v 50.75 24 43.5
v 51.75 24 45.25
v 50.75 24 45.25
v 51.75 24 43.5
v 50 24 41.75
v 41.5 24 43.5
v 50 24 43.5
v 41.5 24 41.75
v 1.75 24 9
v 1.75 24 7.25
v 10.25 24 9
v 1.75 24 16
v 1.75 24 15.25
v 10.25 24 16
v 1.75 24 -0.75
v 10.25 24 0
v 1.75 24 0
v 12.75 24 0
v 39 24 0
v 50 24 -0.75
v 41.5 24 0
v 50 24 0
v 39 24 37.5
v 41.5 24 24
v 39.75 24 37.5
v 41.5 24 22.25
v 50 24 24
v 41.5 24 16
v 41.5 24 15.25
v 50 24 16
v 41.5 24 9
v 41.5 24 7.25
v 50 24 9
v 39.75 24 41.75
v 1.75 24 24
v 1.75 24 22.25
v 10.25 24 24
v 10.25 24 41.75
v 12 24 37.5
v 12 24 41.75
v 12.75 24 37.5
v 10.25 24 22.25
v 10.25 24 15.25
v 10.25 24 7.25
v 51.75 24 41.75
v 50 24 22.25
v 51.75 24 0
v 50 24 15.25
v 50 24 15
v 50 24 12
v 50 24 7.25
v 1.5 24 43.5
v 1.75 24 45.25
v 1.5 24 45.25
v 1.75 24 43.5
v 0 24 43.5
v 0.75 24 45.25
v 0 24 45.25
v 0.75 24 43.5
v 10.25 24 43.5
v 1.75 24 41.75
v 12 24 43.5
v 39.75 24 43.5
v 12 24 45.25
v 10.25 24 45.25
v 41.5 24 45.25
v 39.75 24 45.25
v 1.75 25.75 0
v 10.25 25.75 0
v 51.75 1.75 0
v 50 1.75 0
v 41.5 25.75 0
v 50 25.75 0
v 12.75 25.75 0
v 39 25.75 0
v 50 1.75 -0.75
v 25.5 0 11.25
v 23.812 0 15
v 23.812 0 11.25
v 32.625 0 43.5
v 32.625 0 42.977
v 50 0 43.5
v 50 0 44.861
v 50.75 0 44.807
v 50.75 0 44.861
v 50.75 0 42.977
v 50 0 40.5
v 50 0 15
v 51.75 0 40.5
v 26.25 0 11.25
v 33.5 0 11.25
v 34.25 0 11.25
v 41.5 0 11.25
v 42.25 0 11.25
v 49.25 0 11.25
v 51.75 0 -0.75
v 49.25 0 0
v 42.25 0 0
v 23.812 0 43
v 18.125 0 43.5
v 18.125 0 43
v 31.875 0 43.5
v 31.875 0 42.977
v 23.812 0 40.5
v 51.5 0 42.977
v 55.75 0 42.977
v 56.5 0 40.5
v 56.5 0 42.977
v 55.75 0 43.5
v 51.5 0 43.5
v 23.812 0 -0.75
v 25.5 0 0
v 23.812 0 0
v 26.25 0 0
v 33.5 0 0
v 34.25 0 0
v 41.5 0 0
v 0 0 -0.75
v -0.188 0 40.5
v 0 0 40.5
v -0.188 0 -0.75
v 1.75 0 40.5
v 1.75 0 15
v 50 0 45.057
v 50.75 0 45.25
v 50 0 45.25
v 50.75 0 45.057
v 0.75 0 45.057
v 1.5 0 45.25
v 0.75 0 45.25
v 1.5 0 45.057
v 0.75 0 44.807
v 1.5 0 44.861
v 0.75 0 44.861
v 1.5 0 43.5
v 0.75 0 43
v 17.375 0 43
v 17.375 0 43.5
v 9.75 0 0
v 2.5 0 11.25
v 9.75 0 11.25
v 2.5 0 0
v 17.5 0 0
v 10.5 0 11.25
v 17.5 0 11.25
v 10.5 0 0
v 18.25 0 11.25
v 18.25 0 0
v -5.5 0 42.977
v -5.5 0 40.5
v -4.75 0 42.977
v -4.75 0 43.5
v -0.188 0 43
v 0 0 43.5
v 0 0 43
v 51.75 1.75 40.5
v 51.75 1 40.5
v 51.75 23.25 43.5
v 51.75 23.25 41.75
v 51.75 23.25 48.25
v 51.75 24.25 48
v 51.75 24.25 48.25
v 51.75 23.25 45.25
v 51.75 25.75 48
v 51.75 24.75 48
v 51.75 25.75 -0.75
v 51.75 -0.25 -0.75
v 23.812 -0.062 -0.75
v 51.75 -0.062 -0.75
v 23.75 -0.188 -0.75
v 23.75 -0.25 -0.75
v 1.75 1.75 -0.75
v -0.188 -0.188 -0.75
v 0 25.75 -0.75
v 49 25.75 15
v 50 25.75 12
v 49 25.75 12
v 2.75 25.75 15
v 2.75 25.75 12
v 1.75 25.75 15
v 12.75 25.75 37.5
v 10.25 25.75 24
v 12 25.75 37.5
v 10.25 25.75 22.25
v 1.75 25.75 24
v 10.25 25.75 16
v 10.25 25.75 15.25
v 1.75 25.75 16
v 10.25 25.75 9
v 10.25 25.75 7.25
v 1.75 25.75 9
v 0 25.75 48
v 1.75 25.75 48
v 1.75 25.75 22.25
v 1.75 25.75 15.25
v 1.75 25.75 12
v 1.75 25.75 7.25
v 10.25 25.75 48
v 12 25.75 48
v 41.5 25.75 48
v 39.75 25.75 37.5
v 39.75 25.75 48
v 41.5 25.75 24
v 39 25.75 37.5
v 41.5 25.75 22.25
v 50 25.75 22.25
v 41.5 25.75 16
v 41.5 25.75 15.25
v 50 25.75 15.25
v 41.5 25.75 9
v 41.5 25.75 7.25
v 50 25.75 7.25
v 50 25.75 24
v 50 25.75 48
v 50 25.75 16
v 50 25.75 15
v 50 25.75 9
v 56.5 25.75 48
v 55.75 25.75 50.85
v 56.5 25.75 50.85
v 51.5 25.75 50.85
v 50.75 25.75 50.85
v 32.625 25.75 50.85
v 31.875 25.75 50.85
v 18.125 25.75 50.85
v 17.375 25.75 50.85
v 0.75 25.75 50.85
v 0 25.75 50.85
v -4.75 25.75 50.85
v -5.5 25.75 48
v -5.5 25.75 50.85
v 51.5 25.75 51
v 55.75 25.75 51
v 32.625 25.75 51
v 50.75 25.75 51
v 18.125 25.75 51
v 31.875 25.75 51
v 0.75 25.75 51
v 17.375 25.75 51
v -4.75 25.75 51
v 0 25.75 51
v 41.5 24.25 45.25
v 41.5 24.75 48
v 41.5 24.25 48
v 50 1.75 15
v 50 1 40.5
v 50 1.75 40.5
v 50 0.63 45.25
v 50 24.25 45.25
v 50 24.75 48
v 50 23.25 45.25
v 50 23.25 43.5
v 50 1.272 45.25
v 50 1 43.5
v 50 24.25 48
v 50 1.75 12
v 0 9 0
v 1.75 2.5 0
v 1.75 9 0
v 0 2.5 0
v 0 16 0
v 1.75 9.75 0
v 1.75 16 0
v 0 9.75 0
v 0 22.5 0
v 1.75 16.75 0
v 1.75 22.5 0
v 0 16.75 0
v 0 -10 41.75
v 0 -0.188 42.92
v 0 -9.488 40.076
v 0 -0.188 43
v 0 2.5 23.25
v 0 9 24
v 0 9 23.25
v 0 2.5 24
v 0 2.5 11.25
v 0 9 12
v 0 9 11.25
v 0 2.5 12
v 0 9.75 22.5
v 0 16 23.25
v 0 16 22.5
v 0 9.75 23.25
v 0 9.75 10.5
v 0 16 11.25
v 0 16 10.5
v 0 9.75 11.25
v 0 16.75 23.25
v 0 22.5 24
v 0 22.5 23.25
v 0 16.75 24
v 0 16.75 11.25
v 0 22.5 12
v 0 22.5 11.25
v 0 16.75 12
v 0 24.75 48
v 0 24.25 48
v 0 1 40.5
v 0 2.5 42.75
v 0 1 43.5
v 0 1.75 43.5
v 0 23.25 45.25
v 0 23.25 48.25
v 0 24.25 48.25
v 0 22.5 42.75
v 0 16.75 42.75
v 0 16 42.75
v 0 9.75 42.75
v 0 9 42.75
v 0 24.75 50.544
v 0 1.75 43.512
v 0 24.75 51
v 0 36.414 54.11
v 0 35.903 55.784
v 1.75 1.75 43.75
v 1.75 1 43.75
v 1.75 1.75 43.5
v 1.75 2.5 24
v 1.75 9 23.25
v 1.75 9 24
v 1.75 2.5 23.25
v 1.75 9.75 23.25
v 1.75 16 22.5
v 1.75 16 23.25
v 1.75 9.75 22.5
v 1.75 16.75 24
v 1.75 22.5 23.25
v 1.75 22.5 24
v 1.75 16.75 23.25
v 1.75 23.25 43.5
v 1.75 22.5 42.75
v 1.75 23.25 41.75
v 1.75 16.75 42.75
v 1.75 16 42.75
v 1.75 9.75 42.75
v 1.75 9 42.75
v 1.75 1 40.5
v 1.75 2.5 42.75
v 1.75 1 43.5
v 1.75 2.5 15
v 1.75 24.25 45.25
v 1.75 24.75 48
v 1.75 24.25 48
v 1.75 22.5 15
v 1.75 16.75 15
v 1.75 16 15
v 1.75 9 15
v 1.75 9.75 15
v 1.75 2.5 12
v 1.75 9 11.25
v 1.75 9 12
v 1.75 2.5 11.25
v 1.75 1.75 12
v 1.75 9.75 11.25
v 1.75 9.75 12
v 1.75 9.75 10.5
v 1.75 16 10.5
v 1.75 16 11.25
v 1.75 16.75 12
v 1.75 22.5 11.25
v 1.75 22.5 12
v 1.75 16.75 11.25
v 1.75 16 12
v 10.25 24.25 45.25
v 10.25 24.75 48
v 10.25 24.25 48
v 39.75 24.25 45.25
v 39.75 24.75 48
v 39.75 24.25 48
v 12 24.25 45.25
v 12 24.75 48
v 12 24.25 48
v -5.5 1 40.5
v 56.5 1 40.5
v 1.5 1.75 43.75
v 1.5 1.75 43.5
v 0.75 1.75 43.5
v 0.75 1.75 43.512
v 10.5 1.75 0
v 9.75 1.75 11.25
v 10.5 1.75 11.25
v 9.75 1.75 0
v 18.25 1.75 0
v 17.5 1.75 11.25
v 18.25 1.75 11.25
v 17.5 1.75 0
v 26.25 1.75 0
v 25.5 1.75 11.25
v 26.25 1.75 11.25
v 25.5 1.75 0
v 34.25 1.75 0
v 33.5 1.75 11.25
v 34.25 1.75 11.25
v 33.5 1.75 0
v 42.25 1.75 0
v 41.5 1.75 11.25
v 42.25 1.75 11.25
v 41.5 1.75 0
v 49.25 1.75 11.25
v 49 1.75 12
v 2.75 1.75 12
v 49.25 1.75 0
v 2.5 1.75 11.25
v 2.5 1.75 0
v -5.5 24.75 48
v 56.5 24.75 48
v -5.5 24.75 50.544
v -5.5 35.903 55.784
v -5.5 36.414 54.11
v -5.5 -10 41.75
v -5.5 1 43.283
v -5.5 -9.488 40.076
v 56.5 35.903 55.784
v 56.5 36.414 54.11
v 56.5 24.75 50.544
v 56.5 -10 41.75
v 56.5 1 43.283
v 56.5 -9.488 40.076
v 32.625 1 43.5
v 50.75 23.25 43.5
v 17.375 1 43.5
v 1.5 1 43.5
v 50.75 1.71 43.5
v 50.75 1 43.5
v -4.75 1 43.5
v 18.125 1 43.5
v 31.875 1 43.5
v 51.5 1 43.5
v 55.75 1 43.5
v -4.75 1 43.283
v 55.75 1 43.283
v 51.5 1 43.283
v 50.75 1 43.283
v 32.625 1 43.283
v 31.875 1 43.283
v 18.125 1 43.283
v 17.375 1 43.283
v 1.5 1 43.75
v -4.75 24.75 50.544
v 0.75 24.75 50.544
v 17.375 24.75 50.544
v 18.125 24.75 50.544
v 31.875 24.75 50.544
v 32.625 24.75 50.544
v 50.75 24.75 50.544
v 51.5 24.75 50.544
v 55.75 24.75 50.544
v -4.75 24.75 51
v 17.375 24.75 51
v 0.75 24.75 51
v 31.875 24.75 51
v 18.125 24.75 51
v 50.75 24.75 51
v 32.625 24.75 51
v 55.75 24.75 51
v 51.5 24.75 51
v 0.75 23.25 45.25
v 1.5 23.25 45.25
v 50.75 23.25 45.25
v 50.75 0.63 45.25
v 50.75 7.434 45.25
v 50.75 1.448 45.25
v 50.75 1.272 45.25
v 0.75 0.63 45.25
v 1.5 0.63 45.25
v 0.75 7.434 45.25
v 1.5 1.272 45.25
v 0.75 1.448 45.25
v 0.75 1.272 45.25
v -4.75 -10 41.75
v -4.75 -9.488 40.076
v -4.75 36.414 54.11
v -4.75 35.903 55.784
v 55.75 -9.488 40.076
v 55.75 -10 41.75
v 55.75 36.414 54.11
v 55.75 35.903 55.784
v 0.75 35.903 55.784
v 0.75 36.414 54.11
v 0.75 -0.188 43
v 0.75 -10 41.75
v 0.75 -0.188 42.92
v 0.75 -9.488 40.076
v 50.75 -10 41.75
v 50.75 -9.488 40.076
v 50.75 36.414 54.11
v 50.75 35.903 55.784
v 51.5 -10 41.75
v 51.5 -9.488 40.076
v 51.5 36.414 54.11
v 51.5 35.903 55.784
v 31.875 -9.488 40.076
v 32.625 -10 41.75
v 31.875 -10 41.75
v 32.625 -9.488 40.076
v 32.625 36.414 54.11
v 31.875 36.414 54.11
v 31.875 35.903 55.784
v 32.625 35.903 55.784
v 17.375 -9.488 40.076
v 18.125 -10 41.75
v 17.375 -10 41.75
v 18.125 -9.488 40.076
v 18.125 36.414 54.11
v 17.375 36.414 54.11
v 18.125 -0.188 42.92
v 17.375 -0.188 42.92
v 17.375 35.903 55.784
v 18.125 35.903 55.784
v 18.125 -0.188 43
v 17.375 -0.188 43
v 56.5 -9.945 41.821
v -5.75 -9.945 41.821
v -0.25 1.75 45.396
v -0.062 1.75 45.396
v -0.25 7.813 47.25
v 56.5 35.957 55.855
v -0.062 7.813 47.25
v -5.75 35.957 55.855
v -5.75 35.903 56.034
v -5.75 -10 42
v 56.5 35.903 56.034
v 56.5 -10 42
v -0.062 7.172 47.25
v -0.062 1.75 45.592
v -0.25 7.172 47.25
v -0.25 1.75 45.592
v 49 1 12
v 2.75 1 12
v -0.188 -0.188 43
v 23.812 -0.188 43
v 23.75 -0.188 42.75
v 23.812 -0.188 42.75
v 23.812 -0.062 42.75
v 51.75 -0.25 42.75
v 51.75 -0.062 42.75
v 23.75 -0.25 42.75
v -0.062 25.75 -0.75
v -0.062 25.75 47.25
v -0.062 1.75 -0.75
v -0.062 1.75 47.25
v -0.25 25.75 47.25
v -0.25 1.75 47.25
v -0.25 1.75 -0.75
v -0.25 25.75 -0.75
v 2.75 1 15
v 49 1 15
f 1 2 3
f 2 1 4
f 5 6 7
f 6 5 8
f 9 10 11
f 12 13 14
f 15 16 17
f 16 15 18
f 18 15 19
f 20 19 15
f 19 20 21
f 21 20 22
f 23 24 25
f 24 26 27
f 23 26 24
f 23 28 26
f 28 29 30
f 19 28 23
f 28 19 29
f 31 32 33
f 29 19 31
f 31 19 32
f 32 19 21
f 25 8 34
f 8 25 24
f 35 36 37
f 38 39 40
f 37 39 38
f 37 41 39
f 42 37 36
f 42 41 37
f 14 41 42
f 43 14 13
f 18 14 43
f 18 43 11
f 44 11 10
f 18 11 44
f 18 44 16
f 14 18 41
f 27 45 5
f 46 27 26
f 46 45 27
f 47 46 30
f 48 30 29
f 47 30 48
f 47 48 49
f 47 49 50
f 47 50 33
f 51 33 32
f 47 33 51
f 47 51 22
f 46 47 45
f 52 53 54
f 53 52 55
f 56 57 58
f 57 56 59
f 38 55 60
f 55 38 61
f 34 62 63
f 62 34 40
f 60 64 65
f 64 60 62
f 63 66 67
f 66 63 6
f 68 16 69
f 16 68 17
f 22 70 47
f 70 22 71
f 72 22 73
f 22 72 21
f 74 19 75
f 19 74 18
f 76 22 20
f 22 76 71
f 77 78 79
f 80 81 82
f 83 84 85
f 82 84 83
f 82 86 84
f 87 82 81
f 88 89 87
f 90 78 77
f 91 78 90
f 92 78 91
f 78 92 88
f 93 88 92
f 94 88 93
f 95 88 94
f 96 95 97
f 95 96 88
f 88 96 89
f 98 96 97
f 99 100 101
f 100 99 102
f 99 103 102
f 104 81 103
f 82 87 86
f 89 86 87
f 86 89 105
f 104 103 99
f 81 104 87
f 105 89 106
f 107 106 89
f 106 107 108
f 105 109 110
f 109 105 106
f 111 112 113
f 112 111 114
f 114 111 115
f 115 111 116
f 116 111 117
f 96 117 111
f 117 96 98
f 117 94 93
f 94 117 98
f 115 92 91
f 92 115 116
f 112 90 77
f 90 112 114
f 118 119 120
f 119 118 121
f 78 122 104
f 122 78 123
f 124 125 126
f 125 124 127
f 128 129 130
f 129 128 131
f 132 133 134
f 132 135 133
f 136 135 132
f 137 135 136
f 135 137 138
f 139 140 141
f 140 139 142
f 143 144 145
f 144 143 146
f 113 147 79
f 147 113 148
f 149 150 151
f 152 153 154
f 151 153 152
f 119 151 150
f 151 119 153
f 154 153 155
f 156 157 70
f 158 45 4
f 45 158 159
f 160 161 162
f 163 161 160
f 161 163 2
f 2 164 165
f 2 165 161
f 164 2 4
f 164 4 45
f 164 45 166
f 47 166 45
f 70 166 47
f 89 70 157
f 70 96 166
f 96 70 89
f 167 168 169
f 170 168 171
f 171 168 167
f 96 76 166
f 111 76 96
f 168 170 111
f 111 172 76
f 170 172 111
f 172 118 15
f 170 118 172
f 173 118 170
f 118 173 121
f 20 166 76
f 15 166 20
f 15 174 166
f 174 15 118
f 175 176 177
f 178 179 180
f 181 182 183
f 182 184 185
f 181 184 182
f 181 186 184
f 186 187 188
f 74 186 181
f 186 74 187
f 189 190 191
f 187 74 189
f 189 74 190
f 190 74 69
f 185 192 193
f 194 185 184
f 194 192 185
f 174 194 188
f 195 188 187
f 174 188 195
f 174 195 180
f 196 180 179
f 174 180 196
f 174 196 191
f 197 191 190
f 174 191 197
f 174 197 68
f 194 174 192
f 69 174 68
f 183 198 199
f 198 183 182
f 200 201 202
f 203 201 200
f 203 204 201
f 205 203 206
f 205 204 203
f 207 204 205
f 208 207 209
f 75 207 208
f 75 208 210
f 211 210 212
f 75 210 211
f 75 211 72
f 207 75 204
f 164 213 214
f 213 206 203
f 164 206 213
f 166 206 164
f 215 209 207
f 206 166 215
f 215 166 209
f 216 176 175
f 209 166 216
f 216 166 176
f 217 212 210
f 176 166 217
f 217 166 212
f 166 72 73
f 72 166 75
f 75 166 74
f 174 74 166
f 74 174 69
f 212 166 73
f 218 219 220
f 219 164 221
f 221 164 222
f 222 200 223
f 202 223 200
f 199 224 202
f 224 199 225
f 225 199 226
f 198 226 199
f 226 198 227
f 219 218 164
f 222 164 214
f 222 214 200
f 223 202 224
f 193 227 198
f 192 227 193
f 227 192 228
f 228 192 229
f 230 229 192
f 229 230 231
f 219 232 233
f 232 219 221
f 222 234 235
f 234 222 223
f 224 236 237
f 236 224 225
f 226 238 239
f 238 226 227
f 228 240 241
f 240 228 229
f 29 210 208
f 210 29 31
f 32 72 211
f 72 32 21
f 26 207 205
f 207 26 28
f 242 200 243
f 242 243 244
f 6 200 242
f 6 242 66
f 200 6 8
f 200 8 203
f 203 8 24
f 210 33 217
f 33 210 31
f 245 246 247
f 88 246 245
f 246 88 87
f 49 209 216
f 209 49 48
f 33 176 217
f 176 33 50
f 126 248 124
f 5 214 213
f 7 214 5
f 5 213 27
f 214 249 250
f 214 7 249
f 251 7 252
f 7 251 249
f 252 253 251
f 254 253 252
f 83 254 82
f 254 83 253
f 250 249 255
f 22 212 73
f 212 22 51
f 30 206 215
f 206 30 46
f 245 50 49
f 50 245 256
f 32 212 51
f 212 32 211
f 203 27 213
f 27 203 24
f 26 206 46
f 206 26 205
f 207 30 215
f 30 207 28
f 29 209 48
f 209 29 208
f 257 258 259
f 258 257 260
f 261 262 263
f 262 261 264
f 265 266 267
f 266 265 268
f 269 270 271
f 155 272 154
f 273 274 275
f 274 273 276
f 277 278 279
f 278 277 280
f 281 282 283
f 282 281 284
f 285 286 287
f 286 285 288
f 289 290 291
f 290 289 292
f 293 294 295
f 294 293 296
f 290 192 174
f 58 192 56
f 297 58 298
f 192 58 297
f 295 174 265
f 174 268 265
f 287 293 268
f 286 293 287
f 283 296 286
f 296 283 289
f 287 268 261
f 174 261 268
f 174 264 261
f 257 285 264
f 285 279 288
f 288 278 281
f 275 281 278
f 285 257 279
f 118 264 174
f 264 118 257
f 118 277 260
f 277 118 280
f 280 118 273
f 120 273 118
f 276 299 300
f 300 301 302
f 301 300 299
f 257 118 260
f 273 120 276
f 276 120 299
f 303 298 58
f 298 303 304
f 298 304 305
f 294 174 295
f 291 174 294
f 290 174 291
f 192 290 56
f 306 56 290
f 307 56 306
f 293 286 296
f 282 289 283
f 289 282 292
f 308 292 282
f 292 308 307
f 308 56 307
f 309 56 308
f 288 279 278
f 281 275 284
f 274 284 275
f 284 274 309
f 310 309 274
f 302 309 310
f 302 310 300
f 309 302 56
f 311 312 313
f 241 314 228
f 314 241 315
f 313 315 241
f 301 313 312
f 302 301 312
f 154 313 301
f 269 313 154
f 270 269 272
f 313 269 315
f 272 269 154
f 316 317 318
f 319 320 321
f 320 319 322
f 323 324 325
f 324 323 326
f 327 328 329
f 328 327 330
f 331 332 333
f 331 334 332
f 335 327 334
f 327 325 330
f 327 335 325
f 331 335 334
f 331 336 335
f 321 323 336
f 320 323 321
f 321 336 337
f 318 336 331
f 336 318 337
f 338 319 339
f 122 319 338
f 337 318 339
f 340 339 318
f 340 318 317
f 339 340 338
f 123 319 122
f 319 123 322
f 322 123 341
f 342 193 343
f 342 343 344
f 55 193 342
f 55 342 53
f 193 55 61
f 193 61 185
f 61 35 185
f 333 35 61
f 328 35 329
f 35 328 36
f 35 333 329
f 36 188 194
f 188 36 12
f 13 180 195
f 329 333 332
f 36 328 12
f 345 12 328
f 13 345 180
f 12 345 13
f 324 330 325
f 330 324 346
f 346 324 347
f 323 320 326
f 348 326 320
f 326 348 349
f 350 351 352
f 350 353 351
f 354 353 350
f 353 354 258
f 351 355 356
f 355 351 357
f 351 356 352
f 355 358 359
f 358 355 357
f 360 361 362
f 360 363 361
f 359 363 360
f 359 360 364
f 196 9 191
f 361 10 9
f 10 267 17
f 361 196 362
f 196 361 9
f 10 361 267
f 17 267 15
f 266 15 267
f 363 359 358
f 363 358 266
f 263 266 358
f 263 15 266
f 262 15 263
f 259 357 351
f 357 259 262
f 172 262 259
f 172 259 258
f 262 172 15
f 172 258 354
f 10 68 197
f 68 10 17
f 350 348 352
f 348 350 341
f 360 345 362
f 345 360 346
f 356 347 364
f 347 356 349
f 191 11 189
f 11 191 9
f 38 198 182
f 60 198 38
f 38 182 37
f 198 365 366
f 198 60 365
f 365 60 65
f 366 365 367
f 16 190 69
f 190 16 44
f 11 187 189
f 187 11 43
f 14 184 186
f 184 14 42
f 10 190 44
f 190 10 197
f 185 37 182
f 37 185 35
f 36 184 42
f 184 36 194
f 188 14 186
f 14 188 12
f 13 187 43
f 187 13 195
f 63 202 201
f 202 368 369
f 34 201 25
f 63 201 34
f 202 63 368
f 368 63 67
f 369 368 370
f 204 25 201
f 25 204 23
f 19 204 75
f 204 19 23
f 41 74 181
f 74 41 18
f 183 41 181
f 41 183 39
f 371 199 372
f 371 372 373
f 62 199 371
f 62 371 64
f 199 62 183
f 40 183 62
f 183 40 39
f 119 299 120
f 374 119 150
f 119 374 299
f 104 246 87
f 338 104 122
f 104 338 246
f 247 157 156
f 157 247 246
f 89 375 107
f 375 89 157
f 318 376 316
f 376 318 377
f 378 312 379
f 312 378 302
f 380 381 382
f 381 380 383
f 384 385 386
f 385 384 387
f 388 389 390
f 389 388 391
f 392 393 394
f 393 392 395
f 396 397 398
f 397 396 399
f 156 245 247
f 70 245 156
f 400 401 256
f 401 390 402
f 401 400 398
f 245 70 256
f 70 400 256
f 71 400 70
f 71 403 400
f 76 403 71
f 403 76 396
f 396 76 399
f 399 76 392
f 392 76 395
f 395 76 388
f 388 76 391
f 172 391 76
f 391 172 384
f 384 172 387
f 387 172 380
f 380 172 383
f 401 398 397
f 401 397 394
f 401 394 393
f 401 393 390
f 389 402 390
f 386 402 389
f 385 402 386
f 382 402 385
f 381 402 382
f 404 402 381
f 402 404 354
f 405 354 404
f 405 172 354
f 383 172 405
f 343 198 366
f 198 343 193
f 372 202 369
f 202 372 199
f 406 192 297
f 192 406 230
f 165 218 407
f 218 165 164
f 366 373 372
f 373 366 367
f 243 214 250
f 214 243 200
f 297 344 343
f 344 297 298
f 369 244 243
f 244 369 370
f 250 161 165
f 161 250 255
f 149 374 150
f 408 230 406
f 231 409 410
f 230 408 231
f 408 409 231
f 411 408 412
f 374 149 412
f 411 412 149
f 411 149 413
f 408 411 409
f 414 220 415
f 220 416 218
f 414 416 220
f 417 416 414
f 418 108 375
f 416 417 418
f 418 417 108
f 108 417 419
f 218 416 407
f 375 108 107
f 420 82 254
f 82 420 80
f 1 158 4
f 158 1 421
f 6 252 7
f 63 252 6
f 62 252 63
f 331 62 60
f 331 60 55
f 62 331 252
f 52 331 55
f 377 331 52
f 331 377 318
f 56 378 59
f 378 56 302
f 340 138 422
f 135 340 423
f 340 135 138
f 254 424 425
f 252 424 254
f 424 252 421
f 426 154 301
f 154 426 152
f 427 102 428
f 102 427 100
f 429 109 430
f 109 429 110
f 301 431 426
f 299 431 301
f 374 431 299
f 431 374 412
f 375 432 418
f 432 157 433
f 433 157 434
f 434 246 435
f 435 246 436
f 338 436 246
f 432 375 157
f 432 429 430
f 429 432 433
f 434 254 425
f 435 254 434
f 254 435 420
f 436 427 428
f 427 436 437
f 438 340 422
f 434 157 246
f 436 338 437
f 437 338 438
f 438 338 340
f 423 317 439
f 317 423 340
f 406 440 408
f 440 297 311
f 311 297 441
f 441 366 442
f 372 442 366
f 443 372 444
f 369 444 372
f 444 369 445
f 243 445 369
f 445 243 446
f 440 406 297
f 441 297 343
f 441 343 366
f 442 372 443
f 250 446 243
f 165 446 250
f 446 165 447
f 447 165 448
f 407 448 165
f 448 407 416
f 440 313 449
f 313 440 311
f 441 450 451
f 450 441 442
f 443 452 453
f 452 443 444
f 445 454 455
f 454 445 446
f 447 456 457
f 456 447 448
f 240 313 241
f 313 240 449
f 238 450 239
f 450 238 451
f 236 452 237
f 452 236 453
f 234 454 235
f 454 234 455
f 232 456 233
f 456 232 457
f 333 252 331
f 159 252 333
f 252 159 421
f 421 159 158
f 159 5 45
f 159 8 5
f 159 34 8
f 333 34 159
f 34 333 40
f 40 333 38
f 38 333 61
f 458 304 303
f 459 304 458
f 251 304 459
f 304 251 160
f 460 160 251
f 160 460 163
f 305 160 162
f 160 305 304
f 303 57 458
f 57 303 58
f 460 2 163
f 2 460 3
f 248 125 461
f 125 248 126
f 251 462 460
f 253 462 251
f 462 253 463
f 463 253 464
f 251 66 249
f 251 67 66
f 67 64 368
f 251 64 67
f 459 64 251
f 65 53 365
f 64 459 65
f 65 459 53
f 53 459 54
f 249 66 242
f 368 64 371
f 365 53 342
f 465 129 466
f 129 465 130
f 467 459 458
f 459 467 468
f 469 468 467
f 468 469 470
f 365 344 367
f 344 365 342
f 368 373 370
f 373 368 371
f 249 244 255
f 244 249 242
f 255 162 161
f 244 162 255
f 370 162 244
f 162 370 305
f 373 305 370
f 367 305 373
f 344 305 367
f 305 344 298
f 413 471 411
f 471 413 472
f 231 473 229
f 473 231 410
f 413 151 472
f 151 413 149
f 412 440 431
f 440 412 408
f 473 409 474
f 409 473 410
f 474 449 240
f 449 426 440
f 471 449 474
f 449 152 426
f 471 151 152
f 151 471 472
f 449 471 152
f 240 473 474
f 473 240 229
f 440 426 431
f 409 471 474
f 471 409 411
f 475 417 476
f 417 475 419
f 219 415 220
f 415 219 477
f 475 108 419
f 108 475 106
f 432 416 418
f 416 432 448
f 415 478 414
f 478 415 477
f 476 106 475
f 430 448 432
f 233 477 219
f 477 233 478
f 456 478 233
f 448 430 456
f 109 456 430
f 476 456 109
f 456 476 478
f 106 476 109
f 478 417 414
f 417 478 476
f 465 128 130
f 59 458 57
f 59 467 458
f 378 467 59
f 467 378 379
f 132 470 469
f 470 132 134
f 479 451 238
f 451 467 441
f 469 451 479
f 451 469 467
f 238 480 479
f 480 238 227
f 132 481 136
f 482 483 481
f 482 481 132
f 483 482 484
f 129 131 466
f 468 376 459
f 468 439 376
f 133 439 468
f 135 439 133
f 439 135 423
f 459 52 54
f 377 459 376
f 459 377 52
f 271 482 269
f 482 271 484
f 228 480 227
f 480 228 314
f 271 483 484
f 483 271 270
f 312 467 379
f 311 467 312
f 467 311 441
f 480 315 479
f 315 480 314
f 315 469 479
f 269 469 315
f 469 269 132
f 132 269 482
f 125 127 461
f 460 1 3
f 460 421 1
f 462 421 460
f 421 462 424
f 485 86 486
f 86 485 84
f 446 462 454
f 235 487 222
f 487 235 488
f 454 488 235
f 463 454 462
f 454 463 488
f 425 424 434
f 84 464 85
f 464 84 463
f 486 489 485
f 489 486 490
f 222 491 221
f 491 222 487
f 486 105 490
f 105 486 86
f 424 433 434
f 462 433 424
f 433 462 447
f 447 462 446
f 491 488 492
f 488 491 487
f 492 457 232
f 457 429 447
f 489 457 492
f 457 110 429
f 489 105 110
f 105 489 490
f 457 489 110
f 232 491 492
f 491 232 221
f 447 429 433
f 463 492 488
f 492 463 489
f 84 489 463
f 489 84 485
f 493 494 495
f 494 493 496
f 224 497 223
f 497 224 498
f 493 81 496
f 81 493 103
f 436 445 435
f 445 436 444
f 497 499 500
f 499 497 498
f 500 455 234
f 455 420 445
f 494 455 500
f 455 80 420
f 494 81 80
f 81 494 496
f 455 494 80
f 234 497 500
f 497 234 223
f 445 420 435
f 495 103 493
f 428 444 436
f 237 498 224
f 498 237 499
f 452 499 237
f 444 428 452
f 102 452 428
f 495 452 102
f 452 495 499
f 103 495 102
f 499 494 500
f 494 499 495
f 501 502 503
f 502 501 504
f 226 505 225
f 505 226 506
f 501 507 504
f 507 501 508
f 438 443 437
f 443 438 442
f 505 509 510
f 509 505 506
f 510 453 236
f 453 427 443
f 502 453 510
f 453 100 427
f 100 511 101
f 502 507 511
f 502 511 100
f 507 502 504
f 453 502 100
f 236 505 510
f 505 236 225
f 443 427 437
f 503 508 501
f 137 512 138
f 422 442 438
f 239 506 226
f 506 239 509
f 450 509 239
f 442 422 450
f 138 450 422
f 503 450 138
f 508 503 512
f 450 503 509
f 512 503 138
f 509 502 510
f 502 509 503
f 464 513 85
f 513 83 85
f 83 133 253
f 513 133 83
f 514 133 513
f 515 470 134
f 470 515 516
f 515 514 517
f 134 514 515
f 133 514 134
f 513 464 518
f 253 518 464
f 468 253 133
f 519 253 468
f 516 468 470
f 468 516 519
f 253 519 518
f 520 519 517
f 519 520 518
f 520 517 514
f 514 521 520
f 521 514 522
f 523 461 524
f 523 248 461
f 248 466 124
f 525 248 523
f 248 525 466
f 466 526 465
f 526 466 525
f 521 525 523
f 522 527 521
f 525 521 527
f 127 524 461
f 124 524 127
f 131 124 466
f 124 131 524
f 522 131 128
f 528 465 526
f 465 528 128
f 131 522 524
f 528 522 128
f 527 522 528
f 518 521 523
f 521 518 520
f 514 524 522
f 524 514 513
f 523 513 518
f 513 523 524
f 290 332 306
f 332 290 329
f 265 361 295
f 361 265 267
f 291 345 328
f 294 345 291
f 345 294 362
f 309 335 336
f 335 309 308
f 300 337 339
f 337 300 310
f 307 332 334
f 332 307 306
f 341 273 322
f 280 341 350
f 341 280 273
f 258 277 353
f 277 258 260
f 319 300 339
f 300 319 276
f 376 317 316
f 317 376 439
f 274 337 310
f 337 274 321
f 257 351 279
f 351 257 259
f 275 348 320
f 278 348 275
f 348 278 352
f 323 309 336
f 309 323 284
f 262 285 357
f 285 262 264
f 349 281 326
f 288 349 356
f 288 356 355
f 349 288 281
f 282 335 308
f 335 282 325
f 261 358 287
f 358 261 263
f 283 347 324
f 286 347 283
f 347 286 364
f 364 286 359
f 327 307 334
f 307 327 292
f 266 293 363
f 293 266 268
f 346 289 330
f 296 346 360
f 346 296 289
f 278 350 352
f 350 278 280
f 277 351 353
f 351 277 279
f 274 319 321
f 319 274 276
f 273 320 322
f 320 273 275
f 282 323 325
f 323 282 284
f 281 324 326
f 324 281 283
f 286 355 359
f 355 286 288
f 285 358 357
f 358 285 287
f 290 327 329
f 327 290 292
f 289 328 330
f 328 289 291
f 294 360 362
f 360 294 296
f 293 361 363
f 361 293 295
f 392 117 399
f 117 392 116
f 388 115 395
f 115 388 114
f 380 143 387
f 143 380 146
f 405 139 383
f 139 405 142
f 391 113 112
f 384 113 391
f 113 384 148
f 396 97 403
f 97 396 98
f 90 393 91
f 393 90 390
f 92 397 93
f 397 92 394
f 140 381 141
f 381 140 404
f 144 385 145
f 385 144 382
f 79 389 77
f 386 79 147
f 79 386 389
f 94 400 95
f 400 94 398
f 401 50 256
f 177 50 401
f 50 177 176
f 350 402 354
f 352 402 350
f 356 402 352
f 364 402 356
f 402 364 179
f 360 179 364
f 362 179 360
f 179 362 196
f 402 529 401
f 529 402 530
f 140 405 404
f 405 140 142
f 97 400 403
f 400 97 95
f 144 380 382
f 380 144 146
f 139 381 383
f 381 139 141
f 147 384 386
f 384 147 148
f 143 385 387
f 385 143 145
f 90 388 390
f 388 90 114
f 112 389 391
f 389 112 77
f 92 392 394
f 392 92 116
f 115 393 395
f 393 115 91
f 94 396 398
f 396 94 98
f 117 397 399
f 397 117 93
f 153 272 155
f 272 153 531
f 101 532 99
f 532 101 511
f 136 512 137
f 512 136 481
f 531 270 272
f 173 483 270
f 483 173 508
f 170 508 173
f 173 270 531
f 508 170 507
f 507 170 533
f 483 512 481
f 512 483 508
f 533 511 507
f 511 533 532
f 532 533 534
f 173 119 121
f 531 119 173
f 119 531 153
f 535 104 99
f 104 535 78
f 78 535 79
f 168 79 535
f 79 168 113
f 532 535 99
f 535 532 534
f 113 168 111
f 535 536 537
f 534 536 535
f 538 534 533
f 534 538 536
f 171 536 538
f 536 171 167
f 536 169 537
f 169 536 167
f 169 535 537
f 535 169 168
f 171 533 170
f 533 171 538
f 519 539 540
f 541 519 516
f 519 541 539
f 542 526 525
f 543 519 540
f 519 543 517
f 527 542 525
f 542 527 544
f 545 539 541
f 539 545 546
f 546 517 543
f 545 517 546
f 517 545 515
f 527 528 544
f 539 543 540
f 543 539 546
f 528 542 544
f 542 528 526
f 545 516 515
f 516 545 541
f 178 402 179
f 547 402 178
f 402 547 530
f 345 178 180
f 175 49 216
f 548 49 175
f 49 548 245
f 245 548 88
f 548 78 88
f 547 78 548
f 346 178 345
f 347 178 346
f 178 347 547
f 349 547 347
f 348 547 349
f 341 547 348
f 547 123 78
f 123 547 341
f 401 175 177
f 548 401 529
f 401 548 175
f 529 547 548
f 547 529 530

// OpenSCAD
h=96;
sc=0.5;

module b28(length=96){
   cube([1.5,7.25,length]);
}

module b24(length=96){
   cube([1.5,3.5,length]);
}

module rb26(length=96){
   cube([2,6,length]);
}

module b66(length=96){
   cube([5.5,5.5,length]);
}

module b44(length=96){
   cube([3.5,3.5,length]);
}

module b44(length=96){
   cube([3.5,3.5,length]);
}

module p48(length=96,width=48){
   cube([.375,width,length]);
}

// ground
//% translate([-100,-100,-1]) cube([200,200,1]);

//front side base plate	
scale(sc,sc) color([1,0.5,1]) translate([103.5,0,0]) rotate([-90,90,0]) b24(length=48);
// inset
scale(sc,sc) color([1,0.5,0]) translate([103.5,51.5,0]) rotate([-90,90,90]) b24(length=100);
scale(sc,sc) color([1,0.5,1]) translate([100,51.5,18]) rotate([-90,90,90]) b44(length=17);
scale(sc,sc) color([1,0.5,1]) translate([100,51.5,48]) rotate([-90,90,90]) b44(length=17);
scale(sc,sc) color([1,0.5,1]) translate([100,51.5,32]) rotate([-90,90,90]) b24(length=17);




//left side base plate	
scale(sc,sc) color([1,0.5,1]) translate([3.5,0,0]) rotate([-90,90,0]) b24(length=48);
// inset
scale(sc,sc) color([1,0.5,0]) translate([25.5,51.5,0]) rotate([-90,90,90]) b24(length=25.5);
scale(sc,sc) color([1,0.5,1]) translate([20.5,51.5,18]) rotate([-90,90,90]) b44(length=17);
scale(sc,sc) color([1,0.5,1]) translate([20.5,51.5,48]) rotate([-90,90,90]) b44(length=17);
scale(sc,sc) color([1,0.5,1]) translate([20.5,51.5,32]) rotate([-90,90,90]) b24(length=17);
//door jack stud
scale(sc,sc) color([1,0.5,1])translate([78,48,0])  b24(length=75);
scale(sc,sc) color([1,0.5,1])translate([24,48,0])  b24(length=75);







// back posts
//outside
scale(sc,sc) translate([0,0,0])  b44(length=81);
// back
scale(sc,sc) translate([100,0,0])  b44(length=81);




// front posts
//right
scale(sc,sc) translate([0,48,0])  b44(length=96);
// inset right
scale(sc,sc) translate([20.5,48,0])  b44(length=96);
// left
scale(sc,sc) translate([100,48,0])  b44(length=96);
//inset left
scale(sc,sc) translate([79.5,48,0])  b44(length=96);

//back roof horizontal
scale(sc,sc) color([1,0.5,0]) translate([113,0,87]) rotate([-90,0,90]) rb26(length=124);
//front roof horizontal
scale(sc,sc) color([1,0,0]) translate([113,49.5,102]) rotate([-90,0,90]) rb26(length=124);
//scale(sc,sc) color([1,0.5,0]) translate([103.5,46,87]) rotate([-90,0,90]) rb26(length=103.5);
scale(sc,sc) color([0,1,0]) translate([103.5,46.5,87]) rotate([-90,0,90]) b24(length=103.5);

scale(sc,sc) color([0,1,0]) translate([103.5,46.5,96.5]) rotate([-90,0,90]) rb26(length=103.5);


//



// rafters and support
//right end
//scale(sc,sc) color([1,0,0]) translate([-9.5,48,87]) rotate([90,0,0]) b24(length=48);
scale(sc,sc) color([0.1,0.7,0.1]) translate([-11,-20,83.5]) rotate([-73,0,0]) b24(length=96);
//left end
//scale(sc,sc) color([1,0,0]) translate([110,48,87]) rotate([90,0,0]) b24(length=48);
scale(sc,sc) color([0.1,0.7,0.1]) translate([111.5,-20,83.5]) rotate([-73,0,0]) b24(length=96);
//right end over post
scale(sc,sc) color([1,0,0]) translate([1.5,48,87]) rotate([90,0,0]) b24(length=48);
scale(sc,sc) color([0.1,0.7,0.1]) translate([0,-20,83.5]) rotate([-73,0,0]) b24(length=96);
//left end over post
scale(sc,sc) color([1,0,0]) translate([100,48,87]) rotate([90,0,0]) b24(length=48);
scale(sc,sc) color([0.1,0.7,0.1]) translate([101.5,-20,83.5]) rotate([-73,0,0]) b24(length=96);
// middle right
scale(sc,sc) color([0.1,0.7,0.1]) translate([63.75,-20,83.5]) rotate([-73,0,0]) b24(length=96);
scale(sc,sc) color([0.1,0.7,0.1]) translate([34.75,-20,83.5]) rotate([-73,0,0]) b24(length=96);



//for (i = [-9.5:17.05:110]){
  // scale(sc,sc) color([1,0,0]) translate([i,51.5,87]) rotate([90,0,0]) b24(length=53.5);
   //scale(sc,sc) color([0.1,0.7,0.1]) translate([i-1.5,-18,84.5]) rotate([-73,0,0]) b24(length=96);

//}

/////////////roof sheathing ################
//right
scale(sc,sc) color([0.1,0.2,0.1,0.2]) translate([-11.5,-20,84]) rotate([90,73,90]) p48(length=48,width=96);
//left
scale(sc,sc) color([0.1,0.2,0.1,0.2]) translate([65,-20,84]) rotate([90,73,90]) p48(length=48,width=96);
// middle
scale(sc,sc) color([0.4,0.2,0.1,0.2]) translate([36,-20,84]) rotate([90,73,90]) p48(length=29,width=96);





//right side walls
scale(sc,sc) color([0,0,1]) translate([0,48,0]) rotate([0,0,-90]) b24(length=83.5);
scale(sc,sc) color([1,.7,.7]) translate([0,46.5,0]) rotate([0,0,-90]) b24(length=85.5);//front jack

//scale(sc,sc) color([1,0,0]) translate([0,48,1.5]) rotate([90,90,0]) b24(length=44.5);
scale(sc,sc) color([1,.8,1]) translate([0,5,0]) rotate([0,0,-90]) b24(length=85.5);//back jack
// small insert
scale(sc,sc) color([0,0,1]) translate([0,3.5,81]) rotate([0,0,-90]) b24(length=6.5);//back jack

scale(sc,sc) color([0,1,1]) translate([0,46.5,87]) rotate([90,90,0]) b24(length=43);

//Right Wall verticals
scale(sc,sc) color([.7,.0,.5]) translate([0,19.5,0]) rotate([0,0,-90]) b24(length=85.5);
scale(sc,sc) color([.7,.0,.5]) translate([0,33.5,0]) rotate([0,0,-90]) b24(length=85.5);
//scale(sc,sc) color([.7,.0,.5]) translate([0,41,1.5]) rotate([0,0,-90]) b24(length=66.5);
//Right Wall horizontals	
scale(sc,sc) color([.7,.0,.5]) translate([0,18,24]) rotate([0,90,-90]) b24(length=13);
scale(sc,sc) color([.7,.0,.5]) translate([0,18,48]) rotate([0,90,-90]) b24(length=13);
scale(sc,sc) color([.7,.0,.5]) translate([0,18,24]) rotate([0,90,-90]) b24(length=13);
scale(sc,sc) color([.7,.0,.5]) translate([0,32.5,46.5]) rotate([0,90,-90]) b24(length=13);
scale(sc,sc) color([.7,.0,.5]) translate([0,32.5,22.5]) rotate([0,90,-90]) b24(length=13);
scale(sc,sc) color([.7,.0,.5]) translate([0,45.5,48]) rotate([0,90,-90]) b24(length=12.5);
scale(sc,sc) color([.7,.0,.5]) translate([0,45.5,24]) rotate([0,90,-90]) b24(length=12.5);






// braces
//front
//scale(sc,sc) translate([1,0,0]) rotate([0,45,0]) b44(length=36);
//scale(sc,sc) translate([6.5,44.5,72]) rotate([0,45,0]) b44(length=30);
//scale(sc,sc) translate([95,44.5,70]) rotate([0,-45,0]) b44(length=30);

//side
///scale(sc,sc) translate([100,46,78]) rotate([60,0,0]) b44(length=20);
///scale(sc,sc) translate([0,46,78]) rotate([60,0,0]) b44(length=20);
//back
//scale(sc,sc) translate([0,0.25,48]) rotate([0,45,0]) b44(length=34);
//scale(sc,sc) translate([100,0.25,45]) rotate([0,-45,0]) b44(length=34);

// back walls
scale(sc,sc) color([.6,.8,1]) translate([3.5,0,0]) rotate([-90,90,-90]) b24(length=96.5);//foot plate
scale(sc,sc) color([.6,0,1]) translate([3.5,0,24]) rotate([-90,90,-90]) b24(length=96.5);//top plate
scale(sc,sc) color([.6,.8,0]) translate([3.5,0,0]) rotate([0,0,0]) b24(length=22.5);//right side plate
scale(sc,sc) color([.6,.8,0]) translate([98.5,0,0]) rotate([0,0,0]) b24(length=22.5);//righ(t side plate

// back wall
scale(sc,sc) color([.5,.7,.1]) translate([19.5,0,0]) rotate([0,0,0]) b24(length=22.5);
scale(sc,sc) color([.5,.7,.1]) translate([35,0,0]) rotate([0,0,0]) b24(length=22.5);
scale(sc,sc) color([.5,.7,.1]) translate([51,0,0]) rotate([0,0,0]) b24(length=22.5);
scale(sc,sc) color([.5,.7,.1]) translate([67,0,0]) rotate([0,0,0]) b24(length=22.5);
scale(sc,sc) color([.5,.7,.1]) translate([83,0,0]) rotate([0,0,0]) b24(length=22.5);
//plywood
//back wall
scale(sc,sc) color([.5,.7,.1]) translate([47.625,-0.375,-1.5]) rotate([0,0,90]) p48(length=87.5);
scale(sc,sc) color([.5,.7,.1]) translate([103.5,-.5,-1.5]) rotate([0,0,90]) p48(length=87);
//middle small back
scale(sc,sc) color([.5,.1,.1]) translate([56,-.5,-1.5]) rotate([0,0,90]) p48(length=87,width=8.5);


// right wall
scale(sc,sc) color([.5,.7,.1,.3]) translate([-.5,3.5,-1.5]) rotate([0,0,0]) p48(length=96);
//second right wall

//right side inner back
scale(sc,sc) color([1,0,0]) translate([3.5,51.5,24]) rotate([90,0,0]) rb26(length=51.5);
// left
scale(sc,sc) color([1,0,0]) translate([98,51.5,24]) rotate([90,0,0]) rb26(length=51.5);
// back
scale(sc,sc) color([1,0.5,0]) translate([98,0,30]) rotate([-90,0,90]) rb26(length=92.5);
//
//scale(sc,sc) translate([100,-20.5,24])  b24(length=58.5);
